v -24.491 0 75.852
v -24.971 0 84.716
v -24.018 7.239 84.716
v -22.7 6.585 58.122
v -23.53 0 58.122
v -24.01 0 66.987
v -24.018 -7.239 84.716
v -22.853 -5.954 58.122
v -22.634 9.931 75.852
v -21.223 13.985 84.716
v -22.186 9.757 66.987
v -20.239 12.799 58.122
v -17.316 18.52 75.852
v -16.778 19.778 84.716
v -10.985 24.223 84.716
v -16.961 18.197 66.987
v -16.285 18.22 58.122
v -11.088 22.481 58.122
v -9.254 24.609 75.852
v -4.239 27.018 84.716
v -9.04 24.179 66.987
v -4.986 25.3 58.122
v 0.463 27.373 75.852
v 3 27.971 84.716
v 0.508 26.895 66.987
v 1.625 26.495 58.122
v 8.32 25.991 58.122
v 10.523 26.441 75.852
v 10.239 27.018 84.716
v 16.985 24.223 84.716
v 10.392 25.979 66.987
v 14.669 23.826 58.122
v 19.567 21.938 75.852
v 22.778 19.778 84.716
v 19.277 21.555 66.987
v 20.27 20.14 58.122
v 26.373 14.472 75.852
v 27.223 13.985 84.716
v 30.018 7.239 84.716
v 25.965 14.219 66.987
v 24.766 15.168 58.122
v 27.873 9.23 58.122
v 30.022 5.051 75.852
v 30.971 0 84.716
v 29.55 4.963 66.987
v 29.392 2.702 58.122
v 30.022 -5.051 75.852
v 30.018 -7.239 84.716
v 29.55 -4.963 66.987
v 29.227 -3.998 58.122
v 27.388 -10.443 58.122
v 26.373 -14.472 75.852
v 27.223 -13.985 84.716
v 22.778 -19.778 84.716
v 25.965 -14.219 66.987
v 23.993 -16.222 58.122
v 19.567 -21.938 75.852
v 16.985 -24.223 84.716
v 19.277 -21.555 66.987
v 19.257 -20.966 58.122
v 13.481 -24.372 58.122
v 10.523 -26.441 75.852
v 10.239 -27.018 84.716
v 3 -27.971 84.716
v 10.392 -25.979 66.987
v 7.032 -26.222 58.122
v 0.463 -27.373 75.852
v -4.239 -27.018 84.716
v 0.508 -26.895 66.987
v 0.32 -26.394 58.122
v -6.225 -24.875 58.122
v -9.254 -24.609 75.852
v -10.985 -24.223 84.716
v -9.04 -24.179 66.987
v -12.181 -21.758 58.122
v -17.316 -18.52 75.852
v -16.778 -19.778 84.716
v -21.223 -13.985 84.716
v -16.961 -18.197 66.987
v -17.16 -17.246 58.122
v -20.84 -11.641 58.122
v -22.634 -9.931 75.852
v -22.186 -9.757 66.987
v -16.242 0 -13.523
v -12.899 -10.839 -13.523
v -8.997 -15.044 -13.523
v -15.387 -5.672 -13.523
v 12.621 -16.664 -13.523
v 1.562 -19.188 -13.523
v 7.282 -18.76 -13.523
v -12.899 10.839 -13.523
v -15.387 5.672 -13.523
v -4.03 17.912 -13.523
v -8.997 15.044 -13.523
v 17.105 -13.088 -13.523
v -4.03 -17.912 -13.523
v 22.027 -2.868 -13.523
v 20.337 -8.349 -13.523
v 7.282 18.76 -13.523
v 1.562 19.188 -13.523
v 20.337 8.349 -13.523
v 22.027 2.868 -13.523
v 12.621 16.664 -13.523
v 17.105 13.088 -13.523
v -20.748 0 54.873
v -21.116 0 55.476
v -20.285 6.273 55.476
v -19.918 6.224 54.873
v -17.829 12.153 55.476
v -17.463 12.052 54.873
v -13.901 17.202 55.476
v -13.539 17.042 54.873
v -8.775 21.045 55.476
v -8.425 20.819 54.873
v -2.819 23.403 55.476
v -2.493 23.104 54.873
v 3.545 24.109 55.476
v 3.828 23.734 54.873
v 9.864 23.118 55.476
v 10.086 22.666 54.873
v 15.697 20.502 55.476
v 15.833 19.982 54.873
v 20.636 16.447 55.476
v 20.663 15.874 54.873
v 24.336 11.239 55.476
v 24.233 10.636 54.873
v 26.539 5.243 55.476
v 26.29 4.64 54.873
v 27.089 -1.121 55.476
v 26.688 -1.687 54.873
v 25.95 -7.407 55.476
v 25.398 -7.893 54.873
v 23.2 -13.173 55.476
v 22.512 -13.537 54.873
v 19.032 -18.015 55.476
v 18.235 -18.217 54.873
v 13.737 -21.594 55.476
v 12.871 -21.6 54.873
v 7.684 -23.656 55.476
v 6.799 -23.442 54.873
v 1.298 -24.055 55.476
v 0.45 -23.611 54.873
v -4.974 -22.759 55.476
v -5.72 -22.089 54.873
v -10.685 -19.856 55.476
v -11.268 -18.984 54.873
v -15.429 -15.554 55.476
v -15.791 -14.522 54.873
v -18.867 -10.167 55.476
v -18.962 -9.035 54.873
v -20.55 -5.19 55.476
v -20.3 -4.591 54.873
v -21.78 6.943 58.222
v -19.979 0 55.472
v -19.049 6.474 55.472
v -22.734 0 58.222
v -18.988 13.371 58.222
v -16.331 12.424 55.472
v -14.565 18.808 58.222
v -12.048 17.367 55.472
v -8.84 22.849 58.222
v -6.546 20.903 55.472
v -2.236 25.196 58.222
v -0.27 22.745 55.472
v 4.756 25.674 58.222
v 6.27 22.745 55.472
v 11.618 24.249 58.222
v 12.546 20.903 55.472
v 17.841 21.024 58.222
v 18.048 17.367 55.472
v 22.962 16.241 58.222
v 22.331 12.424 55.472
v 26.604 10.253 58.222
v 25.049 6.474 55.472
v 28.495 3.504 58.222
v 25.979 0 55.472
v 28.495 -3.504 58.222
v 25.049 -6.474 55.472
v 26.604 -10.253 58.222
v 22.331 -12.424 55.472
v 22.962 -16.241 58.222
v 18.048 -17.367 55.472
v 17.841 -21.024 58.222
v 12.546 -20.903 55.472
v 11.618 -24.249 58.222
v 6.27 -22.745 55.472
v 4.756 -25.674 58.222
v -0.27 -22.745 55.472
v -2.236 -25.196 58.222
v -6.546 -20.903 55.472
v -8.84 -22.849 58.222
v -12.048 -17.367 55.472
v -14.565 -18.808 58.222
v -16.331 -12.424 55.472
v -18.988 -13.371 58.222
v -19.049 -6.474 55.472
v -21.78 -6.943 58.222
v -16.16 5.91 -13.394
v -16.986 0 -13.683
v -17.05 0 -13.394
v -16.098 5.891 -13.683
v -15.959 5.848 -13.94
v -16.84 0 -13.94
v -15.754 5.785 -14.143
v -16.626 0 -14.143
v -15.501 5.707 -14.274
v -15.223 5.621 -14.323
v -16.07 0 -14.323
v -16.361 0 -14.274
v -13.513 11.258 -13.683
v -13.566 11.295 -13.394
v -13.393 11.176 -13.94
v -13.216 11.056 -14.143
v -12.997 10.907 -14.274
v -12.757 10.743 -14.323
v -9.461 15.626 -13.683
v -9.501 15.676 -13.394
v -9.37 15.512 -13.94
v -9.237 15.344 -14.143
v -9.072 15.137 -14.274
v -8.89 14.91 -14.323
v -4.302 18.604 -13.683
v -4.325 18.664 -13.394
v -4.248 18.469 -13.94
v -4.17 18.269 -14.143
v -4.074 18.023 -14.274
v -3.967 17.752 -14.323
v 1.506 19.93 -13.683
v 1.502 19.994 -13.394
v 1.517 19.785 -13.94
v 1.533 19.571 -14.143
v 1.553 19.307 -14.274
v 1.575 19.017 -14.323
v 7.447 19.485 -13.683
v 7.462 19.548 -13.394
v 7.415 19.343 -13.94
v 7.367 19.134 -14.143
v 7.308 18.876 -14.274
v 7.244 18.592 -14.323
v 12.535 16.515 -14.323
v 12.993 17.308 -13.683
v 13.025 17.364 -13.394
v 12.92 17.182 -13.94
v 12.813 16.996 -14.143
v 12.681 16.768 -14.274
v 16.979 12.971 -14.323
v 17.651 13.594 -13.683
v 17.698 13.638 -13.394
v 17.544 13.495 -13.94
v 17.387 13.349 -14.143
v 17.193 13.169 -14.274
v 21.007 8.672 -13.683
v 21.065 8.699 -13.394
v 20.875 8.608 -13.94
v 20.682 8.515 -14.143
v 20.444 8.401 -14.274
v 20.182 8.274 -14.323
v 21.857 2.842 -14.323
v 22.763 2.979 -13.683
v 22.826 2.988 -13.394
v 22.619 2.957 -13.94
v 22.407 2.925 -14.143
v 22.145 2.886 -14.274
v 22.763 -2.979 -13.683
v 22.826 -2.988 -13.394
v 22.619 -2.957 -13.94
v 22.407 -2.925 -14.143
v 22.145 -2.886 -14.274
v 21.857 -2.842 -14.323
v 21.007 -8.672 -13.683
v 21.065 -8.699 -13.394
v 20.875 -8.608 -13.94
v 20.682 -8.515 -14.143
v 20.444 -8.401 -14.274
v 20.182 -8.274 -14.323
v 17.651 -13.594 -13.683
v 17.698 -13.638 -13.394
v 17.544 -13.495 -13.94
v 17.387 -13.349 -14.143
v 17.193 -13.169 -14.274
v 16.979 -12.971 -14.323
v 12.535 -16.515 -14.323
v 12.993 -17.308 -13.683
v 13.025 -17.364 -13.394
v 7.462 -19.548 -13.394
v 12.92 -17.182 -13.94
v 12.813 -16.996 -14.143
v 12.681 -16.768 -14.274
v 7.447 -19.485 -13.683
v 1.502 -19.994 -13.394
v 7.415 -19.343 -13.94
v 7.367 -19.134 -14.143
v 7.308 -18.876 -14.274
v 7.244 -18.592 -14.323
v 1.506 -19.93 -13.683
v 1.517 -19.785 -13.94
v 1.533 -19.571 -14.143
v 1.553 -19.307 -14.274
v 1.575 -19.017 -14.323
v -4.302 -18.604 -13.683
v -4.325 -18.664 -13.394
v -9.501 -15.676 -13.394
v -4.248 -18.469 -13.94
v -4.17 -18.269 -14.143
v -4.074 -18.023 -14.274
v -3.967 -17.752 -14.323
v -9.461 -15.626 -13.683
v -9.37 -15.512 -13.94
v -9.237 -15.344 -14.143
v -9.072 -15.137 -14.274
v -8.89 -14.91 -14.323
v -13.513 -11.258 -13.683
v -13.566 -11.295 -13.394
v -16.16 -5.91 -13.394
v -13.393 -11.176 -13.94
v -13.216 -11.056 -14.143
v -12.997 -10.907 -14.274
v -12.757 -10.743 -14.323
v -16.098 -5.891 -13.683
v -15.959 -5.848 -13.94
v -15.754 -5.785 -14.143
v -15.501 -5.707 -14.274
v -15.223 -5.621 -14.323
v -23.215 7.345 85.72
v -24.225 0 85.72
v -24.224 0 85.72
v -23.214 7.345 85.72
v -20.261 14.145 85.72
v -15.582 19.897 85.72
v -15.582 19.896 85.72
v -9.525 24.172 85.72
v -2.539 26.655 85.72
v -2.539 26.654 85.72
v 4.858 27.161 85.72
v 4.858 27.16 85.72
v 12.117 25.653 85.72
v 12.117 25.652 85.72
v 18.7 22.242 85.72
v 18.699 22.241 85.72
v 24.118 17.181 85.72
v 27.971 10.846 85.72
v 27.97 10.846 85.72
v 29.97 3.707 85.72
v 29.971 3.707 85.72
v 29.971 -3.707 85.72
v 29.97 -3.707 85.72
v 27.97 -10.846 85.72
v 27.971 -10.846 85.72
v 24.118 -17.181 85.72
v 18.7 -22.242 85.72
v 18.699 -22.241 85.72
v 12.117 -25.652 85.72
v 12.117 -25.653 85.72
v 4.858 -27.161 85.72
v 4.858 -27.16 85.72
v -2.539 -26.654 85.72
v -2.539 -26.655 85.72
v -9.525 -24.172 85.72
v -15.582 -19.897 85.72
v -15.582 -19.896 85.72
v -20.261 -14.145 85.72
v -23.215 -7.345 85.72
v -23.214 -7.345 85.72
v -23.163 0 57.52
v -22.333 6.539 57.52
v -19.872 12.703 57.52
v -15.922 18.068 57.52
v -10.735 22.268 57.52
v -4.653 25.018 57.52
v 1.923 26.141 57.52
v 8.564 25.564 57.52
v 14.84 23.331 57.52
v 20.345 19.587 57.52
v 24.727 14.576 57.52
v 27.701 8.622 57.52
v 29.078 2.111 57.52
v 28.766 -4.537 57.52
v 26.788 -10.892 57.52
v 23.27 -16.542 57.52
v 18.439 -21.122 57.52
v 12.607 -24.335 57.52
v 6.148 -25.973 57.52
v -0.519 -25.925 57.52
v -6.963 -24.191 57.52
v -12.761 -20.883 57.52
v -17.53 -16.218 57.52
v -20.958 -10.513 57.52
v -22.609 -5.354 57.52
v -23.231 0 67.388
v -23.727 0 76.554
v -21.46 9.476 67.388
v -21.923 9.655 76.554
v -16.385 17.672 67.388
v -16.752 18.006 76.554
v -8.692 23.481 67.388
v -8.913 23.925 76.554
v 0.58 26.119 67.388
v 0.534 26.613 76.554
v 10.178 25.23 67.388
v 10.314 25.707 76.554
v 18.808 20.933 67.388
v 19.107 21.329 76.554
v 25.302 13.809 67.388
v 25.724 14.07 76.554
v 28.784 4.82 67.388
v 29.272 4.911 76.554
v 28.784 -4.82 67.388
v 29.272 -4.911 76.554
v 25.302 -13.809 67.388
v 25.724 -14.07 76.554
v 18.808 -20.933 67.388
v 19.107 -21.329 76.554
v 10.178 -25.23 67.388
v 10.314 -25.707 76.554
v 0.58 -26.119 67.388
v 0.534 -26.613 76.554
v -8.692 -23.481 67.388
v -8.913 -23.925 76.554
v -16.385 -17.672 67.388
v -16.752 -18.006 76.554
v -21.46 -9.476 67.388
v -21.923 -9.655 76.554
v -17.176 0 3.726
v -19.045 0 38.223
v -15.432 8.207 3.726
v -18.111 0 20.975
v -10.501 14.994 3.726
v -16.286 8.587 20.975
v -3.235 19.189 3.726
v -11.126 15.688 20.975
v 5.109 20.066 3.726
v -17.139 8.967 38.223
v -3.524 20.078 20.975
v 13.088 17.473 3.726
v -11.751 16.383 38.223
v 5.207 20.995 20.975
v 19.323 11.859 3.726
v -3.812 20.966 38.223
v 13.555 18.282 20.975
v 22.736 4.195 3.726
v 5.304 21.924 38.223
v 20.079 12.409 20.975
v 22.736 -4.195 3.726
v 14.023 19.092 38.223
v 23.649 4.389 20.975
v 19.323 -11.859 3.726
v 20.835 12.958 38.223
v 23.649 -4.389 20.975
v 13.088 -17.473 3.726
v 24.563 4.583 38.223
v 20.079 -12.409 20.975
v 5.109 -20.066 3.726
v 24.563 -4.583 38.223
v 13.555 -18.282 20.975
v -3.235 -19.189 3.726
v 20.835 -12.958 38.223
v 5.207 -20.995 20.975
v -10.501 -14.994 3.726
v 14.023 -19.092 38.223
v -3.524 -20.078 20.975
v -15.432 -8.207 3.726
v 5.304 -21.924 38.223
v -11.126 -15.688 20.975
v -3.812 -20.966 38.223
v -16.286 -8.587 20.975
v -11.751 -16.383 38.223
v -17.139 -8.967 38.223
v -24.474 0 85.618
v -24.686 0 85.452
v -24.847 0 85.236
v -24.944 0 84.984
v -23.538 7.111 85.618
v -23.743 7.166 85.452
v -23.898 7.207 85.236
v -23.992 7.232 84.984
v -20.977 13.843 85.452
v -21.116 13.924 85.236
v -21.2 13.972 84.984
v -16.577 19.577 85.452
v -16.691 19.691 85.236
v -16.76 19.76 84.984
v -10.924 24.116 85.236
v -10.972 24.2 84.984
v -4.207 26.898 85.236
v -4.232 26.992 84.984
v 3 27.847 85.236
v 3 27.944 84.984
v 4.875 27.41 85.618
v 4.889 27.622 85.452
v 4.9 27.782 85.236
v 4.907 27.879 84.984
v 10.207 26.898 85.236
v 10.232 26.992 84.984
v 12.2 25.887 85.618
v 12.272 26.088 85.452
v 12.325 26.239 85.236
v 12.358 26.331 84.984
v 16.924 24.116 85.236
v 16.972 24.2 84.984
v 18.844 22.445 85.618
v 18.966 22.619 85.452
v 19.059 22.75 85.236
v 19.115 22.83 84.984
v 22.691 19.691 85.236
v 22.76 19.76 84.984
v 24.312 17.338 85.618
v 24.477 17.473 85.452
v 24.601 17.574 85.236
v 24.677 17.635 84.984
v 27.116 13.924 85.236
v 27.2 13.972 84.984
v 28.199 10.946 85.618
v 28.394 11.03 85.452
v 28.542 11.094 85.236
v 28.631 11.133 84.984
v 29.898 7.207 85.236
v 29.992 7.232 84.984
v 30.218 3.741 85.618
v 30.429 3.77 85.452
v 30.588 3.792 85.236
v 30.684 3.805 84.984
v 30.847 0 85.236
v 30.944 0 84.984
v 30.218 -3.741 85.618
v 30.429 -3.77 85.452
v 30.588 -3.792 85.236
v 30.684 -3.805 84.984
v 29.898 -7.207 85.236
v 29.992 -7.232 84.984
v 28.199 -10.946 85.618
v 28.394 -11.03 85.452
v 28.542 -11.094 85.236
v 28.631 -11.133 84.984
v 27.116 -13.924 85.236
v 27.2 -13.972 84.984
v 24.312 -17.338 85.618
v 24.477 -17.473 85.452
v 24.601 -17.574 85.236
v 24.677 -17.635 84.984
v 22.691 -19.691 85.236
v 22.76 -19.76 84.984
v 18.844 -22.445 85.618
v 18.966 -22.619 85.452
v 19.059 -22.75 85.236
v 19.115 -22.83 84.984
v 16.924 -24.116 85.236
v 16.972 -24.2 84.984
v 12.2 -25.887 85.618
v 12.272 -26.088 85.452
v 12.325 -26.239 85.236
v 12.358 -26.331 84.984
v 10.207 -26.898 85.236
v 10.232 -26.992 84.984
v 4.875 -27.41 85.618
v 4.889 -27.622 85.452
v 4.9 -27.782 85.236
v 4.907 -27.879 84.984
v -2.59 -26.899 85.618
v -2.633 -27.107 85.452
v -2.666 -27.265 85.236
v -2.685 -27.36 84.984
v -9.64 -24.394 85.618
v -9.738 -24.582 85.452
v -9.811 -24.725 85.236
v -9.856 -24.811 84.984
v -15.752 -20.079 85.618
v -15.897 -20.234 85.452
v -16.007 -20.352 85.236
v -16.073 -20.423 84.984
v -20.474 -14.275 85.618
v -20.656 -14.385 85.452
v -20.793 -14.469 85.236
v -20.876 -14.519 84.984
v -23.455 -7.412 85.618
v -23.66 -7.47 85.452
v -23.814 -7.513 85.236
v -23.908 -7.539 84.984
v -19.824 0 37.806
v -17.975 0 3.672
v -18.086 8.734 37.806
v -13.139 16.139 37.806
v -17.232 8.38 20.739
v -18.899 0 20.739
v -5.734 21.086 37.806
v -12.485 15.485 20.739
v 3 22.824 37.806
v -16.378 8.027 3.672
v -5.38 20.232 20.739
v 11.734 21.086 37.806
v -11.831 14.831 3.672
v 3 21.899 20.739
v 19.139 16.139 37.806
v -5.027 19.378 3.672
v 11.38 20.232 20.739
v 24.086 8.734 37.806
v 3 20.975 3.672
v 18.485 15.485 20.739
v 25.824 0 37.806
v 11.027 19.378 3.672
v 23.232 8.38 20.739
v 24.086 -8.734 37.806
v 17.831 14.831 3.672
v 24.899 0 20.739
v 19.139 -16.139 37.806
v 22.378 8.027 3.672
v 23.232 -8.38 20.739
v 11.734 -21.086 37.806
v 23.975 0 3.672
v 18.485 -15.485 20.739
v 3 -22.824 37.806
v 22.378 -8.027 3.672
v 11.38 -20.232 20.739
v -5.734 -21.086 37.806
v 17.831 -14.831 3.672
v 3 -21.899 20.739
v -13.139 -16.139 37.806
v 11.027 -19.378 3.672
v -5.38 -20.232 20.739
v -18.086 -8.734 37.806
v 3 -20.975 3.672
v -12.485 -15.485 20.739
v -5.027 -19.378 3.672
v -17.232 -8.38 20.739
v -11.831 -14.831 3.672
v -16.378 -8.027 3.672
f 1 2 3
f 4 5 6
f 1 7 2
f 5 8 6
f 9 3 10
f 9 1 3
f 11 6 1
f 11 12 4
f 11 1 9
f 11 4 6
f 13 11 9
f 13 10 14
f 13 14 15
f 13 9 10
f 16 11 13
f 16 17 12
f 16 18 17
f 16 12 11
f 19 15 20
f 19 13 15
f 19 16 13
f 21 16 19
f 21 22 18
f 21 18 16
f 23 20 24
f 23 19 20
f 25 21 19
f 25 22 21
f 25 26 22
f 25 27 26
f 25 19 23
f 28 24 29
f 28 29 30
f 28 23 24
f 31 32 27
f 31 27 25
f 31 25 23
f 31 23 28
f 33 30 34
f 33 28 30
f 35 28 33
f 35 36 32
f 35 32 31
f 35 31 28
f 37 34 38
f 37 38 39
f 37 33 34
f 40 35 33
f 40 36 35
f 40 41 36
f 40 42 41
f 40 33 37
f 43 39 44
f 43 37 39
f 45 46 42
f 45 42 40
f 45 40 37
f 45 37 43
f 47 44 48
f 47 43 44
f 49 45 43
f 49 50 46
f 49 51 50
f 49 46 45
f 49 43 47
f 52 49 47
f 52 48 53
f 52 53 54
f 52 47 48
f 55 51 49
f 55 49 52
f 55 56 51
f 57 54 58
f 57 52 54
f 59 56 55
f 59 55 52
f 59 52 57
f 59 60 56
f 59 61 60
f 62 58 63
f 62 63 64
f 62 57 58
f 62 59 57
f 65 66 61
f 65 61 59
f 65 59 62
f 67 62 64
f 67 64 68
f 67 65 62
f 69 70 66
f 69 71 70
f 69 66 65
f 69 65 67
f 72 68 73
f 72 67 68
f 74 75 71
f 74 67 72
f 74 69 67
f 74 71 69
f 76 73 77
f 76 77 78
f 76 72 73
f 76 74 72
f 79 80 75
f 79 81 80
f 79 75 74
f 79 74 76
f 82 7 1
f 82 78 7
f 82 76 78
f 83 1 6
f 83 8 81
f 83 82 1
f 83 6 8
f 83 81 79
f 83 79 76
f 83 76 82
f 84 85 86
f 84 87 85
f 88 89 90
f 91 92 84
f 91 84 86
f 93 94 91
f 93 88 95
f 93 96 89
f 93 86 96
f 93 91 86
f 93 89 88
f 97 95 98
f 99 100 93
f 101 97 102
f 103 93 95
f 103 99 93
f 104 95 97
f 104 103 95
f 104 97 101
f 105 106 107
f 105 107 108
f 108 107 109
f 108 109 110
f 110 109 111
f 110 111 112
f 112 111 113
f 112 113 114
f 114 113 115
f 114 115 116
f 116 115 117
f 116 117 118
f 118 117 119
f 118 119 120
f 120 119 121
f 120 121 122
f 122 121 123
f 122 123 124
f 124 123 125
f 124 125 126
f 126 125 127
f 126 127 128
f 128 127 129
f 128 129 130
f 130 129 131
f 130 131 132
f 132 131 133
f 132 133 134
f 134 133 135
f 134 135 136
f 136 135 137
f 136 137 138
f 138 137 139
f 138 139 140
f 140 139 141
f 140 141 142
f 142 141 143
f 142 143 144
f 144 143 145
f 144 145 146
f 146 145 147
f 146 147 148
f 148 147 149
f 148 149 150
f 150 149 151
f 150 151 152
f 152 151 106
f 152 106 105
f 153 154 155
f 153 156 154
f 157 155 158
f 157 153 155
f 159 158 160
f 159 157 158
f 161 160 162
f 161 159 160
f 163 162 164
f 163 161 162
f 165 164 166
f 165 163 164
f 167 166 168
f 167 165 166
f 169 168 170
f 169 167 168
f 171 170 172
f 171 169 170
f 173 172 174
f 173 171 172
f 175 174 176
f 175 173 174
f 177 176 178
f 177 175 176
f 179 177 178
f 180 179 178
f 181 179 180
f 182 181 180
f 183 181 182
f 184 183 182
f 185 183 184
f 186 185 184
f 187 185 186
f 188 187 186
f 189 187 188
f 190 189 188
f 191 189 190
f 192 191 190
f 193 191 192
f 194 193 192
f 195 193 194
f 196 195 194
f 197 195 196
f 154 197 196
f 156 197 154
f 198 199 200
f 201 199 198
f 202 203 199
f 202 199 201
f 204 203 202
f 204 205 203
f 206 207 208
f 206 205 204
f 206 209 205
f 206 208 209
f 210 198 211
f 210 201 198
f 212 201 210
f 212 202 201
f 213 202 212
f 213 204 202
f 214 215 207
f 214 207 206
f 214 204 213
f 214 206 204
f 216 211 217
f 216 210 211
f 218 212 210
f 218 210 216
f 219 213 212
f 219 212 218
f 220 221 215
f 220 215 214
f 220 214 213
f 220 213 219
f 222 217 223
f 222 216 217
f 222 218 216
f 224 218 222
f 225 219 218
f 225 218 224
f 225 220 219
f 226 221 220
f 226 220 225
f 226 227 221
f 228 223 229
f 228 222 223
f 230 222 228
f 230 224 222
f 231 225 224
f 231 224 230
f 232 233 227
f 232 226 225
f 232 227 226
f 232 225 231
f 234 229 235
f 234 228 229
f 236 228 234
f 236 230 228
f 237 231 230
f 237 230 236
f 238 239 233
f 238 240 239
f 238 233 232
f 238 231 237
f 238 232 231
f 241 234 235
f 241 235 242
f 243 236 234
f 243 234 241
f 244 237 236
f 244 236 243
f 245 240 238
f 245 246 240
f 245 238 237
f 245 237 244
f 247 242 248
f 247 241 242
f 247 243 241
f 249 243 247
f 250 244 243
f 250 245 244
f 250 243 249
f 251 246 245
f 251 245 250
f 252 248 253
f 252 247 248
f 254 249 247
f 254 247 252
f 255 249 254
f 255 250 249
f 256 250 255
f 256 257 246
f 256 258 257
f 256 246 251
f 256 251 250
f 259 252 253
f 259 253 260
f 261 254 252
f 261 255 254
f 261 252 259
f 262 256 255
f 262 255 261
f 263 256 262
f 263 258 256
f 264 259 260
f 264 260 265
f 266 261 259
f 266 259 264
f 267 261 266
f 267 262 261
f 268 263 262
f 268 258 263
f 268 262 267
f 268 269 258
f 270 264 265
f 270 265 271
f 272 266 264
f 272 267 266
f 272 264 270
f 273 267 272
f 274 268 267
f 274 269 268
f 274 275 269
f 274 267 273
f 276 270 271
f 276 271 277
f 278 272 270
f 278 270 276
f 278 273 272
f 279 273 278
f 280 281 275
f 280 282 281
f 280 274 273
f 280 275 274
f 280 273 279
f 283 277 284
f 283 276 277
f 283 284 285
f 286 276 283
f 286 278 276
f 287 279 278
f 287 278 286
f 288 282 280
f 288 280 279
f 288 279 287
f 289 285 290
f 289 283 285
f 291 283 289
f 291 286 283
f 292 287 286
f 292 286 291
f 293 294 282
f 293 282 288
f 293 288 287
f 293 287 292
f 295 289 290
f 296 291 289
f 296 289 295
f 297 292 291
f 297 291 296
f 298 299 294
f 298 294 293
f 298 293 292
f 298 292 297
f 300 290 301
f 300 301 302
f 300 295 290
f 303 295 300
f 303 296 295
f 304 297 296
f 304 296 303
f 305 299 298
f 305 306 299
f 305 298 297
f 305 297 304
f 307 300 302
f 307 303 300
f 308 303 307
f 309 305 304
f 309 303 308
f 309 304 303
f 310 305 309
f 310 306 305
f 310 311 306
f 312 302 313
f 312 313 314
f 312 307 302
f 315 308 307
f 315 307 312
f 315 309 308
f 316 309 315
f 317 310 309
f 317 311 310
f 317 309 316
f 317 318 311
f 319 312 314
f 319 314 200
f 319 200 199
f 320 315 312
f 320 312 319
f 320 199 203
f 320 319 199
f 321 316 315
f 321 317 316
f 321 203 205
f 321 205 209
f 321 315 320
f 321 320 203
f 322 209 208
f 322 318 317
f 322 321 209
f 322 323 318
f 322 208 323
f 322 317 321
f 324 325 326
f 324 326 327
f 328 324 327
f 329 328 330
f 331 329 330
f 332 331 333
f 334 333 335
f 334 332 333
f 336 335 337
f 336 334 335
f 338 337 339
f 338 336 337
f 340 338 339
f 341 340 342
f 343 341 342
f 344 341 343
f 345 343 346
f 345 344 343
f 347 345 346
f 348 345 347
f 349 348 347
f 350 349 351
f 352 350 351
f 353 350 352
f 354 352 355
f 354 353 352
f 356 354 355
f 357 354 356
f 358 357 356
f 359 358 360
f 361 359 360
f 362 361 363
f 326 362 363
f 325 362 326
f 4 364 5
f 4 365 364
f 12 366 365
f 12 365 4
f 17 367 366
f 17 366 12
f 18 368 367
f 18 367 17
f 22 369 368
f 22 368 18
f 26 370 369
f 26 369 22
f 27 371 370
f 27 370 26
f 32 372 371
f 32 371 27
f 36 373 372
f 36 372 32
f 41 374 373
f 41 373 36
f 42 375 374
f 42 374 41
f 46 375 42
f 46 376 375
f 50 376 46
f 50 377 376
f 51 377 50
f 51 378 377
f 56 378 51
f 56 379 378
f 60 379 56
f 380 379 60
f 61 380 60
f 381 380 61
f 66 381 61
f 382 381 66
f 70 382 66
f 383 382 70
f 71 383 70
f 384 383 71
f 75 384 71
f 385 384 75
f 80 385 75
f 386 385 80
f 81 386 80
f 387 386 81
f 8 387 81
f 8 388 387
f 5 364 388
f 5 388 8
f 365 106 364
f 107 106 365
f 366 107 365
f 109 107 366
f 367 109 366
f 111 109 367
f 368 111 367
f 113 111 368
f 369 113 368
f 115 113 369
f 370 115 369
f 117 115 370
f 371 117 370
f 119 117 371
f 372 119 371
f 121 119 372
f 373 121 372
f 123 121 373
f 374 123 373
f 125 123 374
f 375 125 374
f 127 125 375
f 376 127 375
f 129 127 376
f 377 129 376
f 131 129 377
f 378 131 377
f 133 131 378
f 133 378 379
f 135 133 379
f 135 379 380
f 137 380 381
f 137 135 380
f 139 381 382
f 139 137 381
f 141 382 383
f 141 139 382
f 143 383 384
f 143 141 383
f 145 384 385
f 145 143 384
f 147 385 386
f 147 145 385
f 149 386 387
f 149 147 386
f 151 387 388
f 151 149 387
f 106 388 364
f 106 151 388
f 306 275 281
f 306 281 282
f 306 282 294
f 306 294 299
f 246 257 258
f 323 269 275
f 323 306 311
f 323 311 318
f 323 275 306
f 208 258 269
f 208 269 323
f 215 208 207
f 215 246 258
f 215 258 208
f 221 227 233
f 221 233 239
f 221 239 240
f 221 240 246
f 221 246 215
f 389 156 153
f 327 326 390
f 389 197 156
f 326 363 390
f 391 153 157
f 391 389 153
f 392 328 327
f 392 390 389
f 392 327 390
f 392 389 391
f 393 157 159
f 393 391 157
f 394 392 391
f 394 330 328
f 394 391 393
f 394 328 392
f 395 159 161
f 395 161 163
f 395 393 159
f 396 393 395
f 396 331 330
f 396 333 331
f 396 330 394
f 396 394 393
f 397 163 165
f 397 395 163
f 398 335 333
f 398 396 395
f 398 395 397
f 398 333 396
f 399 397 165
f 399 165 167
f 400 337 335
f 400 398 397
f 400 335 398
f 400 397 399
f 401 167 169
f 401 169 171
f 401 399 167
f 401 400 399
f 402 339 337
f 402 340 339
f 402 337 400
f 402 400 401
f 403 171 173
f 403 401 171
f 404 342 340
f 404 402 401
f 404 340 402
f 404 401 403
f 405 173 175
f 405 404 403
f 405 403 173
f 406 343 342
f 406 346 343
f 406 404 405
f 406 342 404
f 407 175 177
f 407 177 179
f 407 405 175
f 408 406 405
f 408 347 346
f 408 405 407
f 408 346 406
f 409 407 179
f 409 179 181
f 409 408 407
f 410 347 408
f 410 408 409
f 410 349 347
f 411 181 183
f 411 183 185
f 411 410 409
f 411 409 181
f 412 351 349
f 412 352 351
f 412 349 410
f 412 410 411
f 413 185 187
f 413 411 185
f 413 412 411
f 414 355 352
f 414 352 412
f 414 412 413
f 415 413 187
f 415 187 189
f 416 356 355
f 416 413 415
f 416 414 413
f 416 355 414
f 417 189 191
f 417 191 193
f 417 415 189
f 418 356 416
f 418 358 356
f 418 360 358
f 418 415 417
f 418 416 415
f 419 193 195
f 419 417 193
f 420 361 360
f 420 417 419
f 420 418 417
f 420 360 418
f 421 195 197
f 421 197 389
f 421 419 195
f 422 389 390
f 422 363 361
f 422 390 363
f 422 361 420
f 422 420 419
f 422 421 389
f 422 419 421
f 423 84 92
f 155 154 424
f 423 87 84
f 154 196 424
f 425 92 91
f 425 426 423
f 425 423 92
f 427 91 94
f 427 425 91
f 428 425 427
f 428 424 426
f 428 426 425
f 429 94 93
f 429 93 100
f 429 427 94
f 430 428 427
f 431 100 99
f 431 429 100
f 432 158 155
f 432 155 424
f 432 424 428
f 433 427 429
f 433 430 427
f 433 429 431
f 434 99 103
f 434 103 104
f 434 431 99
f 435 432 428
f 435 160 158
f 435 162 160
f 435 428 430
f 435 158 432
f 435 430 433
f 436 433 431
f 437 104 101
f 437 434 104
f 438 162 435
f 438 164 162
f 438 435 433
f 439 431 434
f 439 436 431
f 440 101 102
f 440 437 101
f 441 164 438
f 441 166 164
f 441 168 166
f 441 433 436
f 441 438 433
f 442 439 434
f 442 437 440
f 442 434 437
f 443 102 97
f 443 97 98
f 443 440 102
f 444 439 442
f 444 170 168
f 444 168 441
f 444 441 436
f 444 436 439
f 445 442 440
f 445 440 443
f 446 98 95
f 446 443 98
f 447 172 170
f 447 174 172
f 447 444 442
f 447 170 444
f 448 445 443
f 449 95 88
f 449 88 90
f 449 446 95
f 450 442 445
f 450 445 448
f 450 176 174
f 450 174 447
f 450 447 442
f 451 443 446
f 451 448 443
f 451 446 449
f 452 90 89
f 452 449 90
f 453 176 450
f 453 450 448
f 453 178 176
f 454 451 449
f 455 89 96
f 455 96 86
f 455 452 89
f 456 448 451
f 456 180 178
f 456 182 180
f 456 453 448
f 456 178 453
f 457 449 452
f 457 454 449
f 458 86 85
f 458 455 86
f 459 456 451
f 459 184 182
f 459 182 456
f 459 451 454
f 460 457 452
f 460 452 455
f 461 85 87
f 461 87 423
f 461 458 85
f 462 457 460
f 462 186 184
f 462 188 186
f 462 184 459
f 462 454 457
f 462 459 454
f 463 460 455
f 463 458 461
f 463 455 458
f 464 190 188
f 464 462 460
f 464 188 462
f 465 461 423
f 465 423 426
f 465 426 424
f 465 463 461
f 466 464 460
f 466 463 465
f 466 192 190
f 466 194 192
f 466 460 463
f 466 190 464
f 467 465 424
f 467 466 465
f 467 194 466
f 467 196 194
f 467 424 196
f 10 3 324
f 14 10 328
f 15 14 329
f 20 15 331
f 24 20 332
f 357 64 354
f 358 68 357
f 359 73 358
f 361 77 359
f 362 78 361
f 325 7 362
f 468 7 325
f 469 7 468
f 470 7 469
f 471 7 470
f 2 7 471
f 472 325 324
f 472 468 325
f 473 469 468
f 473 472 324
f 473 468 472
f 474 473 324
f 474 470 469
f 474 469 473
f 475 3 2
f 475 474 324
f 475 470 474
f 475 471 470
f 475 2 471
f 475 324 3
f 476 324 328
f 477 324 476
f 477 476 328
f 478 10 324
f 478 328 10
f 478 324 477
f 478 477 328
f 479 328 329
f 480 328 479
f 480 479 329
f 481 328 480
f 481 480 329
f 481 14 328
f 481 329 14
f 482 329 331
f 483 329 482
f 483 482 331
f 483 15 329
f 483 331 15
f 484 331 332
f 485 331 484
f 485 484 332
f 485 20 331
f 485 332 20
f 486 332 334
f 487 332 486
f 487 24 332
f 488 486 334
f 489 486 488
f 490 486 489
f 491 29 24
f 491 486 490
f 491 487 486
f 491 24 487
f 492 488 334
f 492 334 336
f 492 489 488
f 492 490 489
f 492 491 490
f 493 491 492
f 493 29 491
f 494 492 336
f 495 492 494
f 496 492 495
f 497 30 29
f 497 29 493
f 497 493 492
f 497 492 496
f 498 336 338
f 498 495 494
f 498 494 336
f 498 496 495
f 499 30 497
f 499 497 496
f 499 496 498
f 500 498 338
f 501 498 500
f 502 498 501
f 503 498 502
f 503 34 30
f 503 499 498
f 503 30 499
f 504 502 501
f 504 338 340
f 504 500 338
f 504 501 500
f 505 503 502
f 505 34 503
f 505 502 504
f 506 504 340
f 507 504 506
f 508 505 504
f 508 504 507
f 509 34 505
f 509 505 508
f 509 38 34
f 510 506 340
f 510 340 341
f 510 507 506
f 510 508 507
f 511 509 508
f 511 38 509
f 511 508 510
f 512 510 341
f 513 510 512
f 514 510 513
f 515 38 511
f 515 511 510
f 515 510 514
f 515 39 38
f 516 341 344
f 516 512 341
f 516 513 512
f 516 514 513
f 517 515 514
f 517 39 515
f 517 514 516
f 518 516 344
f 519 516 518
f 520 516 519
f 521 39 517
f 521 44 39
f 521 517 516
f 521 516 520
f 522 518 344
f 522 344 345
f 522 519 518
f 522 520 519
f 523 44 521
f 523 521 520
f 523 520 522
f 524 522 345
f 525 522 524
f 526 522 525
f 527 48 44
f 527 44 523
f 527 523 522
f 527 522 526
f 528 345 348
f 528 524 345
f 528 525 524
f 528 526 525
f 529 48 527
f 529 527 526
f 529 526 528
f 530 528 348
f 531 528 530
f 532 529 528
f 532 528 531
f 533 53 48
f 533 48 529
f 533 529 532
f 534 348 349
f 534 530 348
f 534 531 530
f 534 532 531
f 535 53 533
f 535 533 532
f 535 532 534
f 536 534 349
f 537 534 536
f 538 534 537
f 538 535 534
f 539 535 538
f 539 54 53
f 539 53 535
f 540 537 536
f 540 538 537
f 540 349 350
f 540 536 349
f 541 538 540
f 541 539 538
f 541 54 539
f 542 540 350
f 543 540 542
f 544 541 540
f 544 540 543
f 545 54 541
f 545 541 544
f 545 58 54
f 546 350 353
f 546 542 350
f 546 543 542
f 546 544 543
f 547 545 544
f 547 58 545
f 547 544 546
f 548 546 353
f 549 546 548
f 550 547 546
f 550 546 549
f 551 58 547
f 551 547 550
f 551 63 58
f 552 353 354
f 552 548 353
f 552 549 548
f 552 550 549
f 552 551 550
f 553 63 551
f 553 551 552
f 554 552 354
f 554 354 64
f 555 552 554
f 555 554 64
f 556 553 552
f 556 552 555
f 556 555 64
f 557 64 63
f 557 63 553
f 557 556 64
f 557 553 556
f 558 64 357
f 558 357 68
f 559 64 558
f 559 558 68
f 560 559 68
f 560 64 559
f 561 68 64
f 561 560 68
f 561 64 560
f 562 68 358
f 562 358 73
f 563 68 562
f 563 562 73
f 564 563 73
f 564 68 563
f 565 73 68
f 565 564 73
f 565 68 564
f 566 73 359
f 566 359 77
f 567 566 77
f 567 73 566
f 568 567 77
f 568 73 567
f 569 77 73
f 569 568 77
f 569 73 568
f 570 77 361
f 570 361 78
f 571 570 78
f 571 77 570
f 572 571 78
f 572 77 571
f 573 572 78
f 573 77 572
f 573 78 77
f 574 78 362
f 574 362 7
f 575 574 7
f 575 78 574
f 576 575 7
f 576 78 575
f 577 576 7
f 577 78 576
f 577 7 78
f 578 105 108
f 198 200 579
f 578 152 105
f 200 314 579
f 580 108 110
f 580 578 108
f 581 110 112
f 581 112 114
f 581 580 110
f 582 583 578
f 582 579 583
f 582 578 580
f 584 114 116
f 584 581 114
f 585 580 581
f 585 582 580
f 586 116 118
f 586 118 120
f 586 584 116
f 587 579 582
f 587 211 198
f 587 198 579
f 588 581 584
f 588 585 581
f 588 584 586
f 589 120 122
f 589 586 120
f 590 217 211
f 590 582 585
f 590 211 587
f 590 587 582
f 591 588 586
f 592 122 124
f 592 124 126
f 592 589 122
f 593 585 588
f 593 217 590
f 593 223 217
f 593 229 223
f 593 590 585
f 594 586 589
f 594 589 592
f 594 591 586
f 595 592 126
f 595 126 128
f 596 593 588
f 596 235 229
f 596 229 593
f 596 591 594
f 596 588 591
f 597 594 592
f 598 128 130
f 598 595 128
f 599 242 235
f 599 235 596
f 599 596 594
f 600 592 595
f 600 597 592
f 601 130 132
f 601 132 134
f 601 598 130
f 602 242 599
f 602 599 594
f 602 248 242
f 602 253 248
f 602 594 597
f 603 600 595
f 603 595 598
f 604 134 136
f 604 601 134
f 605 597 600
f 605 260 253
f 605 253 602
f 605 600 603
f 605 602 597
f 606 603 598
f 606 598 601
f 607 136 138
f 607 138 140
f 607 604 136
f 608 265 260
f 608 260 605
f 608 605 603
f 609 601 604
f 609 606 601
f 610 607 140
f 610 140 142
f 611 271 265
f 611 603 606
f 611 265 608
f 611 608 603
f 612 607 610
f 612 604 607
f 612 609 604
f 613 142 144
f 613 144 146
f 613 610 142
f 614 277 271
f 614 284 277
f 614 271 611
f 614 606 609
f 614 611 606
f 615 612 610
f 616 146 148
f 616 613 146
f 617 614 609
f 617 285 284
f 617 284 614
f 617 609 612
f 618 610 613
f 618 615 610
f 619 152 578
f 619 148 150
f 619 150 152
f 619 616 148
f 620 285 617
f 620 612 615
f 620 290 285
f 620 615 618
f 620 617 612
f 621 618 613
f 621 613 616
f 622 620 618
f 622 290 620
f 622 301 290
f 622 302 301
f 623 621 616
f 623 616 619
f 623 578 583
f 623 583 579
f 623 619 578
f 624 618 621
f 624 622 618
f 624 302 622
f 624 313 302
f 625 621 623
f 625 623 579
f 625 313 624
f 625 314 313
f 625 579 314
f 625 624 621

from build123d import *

# Parameters (mm, degrees)
F3_C1_SIZE2 = 0.25
F3_C1_SIZE  = 0.5
F3_C2_SIZE2 = 0.25
F3_C2_SIZE  = 0.5


# Not quite as in the source:
# - a fillet or chamfer that OpenCascade refuses, or shapes differently, is made with other operations: its cross-section is extruded or revolved along the edge and cut away or added


with BuildPart() as f1:
    # F0 (on Front) → F1 (revolve)
    with BuildSketch(Plane.XZ):
        Polygon((-24.2239079518, 85.7203521749), (-25.0227362253, 85.6770823112), (-23.5166698694, 57.8727796674), (-20.7616358603, 55.1226193476), (-17.0000027865, -14.3229160458), (2.9999972135, -14.3229160458), (2.9999972135, -13.5229167386), (-16.2421640236, -13.5229167386), (-19.9793957734, 55.4721326625), (-22.7344297825, 58.2222929823), align=None)
    revolve(axis=Axis((2.9999972135, 0, 16.662178661), (0, 0, -1)))

    # F2: fillet of radius 1 on 2 edges, made by hand

    # F2_s1 → F2_t2 (revolve, cut)
    with BuildSketch(Plane.XZ):
        with BuildLine():
            ThreePointArc((-24.2239458394, 85.7204973112), (-24.7789966166, 85.342605366), (-24.9698980485, 84.6988349638))
            Line((-24.9698980485, 84.6988349638), (-24.9898687726, 84.6977532163))
            ThreePointArc((-24.9898687726, 84.6977532163), (-25.0162129708, 85.1868809465), (-25.0427069494, 85.6760005637))
            Line((-25.0427069494, 85.6760005637), (-25.0238179728, 85.6970530353))
            ThreePointArc((-25.0238179728, 85.6970530353), (-24.6244188052, 85.7186871564), (-24.2289975194, 85.7398488106))
            Line((-24.2289975194, 85.7398488106), (-24.2239458394, 85.7204973112))
        make_face()
    revolve(axis=Axis((2.9999972135, 0, 85.6770823112), (0, 0, -1)), mode=Mode.SUBTRACT)

    # F2_s3 → F2_t4 (revolve, cut)
    with BuildSketch(Plane.XZ):
        with BuildLine():
            ThreePointArc((-17.0513818139, -13.3771534223), (-16.7405637995, -14.0490437922), (-16.0528456074, -14.3230660458))
            Line((-16.0528456074, -14.3230660458), (-16.0528456074, -14.3430660458))
            ThreePointArc((-16.0528456074, -14.3430660458), (-16.526424197, -14.3429160458), (-17.0000027865, -14.3429160458))
            Line((-17.0000027865, -14.3429160458), (-17.0199735106, -14.3239977933))
            ThreePointArc((-17.0199735106, -14.3239977933), (-17.0455881341, -13.851112425), (-17.071352538, -13.3782351698))
            Line((-17.071352538, -13.3782351698), (-17.0513818139, -13.3771534223))
        make_face()
    revolve(axis=Axis((2.9999972135, 0, -14.3229160458), (0, 0, -1)), mode=Mode.SUBTRACT)

    # F3: chamfer of 0.25 x 0.5 on 3 edges, made by hand

    # F3_c1
    f3_c1_edges = [f1.edges().sort_by_distance(p)[0] for p in [
        (26.7616302873, 0, 55.1226193476),
    ]]
    f3_c1_side = f1.faces().sort_by_distance((26.7651689498, 0, 55.1261517501))[0]
    chamfer(f3_c1_edges, length=F3_C1_SIZE, length2=F3_C1_SIZE2, reference=f3_c1_side)

    # F3_c2
    f3_c2_edges = [f1.edges().sort_by_distance(p)[0] for p in [
        (29.5166642964, 0, 57.8727796674),
    ]]
    f3_c2_side = f1.faces().sort_by_distance((29.5131256339, 0, 57.8692472648))[0]
    chamfer(f3_c2_edges, length=F3_C2_SIZE, length2=F3_C2_SIZE2, reference=f3_c2_side)


solid = f1.part
